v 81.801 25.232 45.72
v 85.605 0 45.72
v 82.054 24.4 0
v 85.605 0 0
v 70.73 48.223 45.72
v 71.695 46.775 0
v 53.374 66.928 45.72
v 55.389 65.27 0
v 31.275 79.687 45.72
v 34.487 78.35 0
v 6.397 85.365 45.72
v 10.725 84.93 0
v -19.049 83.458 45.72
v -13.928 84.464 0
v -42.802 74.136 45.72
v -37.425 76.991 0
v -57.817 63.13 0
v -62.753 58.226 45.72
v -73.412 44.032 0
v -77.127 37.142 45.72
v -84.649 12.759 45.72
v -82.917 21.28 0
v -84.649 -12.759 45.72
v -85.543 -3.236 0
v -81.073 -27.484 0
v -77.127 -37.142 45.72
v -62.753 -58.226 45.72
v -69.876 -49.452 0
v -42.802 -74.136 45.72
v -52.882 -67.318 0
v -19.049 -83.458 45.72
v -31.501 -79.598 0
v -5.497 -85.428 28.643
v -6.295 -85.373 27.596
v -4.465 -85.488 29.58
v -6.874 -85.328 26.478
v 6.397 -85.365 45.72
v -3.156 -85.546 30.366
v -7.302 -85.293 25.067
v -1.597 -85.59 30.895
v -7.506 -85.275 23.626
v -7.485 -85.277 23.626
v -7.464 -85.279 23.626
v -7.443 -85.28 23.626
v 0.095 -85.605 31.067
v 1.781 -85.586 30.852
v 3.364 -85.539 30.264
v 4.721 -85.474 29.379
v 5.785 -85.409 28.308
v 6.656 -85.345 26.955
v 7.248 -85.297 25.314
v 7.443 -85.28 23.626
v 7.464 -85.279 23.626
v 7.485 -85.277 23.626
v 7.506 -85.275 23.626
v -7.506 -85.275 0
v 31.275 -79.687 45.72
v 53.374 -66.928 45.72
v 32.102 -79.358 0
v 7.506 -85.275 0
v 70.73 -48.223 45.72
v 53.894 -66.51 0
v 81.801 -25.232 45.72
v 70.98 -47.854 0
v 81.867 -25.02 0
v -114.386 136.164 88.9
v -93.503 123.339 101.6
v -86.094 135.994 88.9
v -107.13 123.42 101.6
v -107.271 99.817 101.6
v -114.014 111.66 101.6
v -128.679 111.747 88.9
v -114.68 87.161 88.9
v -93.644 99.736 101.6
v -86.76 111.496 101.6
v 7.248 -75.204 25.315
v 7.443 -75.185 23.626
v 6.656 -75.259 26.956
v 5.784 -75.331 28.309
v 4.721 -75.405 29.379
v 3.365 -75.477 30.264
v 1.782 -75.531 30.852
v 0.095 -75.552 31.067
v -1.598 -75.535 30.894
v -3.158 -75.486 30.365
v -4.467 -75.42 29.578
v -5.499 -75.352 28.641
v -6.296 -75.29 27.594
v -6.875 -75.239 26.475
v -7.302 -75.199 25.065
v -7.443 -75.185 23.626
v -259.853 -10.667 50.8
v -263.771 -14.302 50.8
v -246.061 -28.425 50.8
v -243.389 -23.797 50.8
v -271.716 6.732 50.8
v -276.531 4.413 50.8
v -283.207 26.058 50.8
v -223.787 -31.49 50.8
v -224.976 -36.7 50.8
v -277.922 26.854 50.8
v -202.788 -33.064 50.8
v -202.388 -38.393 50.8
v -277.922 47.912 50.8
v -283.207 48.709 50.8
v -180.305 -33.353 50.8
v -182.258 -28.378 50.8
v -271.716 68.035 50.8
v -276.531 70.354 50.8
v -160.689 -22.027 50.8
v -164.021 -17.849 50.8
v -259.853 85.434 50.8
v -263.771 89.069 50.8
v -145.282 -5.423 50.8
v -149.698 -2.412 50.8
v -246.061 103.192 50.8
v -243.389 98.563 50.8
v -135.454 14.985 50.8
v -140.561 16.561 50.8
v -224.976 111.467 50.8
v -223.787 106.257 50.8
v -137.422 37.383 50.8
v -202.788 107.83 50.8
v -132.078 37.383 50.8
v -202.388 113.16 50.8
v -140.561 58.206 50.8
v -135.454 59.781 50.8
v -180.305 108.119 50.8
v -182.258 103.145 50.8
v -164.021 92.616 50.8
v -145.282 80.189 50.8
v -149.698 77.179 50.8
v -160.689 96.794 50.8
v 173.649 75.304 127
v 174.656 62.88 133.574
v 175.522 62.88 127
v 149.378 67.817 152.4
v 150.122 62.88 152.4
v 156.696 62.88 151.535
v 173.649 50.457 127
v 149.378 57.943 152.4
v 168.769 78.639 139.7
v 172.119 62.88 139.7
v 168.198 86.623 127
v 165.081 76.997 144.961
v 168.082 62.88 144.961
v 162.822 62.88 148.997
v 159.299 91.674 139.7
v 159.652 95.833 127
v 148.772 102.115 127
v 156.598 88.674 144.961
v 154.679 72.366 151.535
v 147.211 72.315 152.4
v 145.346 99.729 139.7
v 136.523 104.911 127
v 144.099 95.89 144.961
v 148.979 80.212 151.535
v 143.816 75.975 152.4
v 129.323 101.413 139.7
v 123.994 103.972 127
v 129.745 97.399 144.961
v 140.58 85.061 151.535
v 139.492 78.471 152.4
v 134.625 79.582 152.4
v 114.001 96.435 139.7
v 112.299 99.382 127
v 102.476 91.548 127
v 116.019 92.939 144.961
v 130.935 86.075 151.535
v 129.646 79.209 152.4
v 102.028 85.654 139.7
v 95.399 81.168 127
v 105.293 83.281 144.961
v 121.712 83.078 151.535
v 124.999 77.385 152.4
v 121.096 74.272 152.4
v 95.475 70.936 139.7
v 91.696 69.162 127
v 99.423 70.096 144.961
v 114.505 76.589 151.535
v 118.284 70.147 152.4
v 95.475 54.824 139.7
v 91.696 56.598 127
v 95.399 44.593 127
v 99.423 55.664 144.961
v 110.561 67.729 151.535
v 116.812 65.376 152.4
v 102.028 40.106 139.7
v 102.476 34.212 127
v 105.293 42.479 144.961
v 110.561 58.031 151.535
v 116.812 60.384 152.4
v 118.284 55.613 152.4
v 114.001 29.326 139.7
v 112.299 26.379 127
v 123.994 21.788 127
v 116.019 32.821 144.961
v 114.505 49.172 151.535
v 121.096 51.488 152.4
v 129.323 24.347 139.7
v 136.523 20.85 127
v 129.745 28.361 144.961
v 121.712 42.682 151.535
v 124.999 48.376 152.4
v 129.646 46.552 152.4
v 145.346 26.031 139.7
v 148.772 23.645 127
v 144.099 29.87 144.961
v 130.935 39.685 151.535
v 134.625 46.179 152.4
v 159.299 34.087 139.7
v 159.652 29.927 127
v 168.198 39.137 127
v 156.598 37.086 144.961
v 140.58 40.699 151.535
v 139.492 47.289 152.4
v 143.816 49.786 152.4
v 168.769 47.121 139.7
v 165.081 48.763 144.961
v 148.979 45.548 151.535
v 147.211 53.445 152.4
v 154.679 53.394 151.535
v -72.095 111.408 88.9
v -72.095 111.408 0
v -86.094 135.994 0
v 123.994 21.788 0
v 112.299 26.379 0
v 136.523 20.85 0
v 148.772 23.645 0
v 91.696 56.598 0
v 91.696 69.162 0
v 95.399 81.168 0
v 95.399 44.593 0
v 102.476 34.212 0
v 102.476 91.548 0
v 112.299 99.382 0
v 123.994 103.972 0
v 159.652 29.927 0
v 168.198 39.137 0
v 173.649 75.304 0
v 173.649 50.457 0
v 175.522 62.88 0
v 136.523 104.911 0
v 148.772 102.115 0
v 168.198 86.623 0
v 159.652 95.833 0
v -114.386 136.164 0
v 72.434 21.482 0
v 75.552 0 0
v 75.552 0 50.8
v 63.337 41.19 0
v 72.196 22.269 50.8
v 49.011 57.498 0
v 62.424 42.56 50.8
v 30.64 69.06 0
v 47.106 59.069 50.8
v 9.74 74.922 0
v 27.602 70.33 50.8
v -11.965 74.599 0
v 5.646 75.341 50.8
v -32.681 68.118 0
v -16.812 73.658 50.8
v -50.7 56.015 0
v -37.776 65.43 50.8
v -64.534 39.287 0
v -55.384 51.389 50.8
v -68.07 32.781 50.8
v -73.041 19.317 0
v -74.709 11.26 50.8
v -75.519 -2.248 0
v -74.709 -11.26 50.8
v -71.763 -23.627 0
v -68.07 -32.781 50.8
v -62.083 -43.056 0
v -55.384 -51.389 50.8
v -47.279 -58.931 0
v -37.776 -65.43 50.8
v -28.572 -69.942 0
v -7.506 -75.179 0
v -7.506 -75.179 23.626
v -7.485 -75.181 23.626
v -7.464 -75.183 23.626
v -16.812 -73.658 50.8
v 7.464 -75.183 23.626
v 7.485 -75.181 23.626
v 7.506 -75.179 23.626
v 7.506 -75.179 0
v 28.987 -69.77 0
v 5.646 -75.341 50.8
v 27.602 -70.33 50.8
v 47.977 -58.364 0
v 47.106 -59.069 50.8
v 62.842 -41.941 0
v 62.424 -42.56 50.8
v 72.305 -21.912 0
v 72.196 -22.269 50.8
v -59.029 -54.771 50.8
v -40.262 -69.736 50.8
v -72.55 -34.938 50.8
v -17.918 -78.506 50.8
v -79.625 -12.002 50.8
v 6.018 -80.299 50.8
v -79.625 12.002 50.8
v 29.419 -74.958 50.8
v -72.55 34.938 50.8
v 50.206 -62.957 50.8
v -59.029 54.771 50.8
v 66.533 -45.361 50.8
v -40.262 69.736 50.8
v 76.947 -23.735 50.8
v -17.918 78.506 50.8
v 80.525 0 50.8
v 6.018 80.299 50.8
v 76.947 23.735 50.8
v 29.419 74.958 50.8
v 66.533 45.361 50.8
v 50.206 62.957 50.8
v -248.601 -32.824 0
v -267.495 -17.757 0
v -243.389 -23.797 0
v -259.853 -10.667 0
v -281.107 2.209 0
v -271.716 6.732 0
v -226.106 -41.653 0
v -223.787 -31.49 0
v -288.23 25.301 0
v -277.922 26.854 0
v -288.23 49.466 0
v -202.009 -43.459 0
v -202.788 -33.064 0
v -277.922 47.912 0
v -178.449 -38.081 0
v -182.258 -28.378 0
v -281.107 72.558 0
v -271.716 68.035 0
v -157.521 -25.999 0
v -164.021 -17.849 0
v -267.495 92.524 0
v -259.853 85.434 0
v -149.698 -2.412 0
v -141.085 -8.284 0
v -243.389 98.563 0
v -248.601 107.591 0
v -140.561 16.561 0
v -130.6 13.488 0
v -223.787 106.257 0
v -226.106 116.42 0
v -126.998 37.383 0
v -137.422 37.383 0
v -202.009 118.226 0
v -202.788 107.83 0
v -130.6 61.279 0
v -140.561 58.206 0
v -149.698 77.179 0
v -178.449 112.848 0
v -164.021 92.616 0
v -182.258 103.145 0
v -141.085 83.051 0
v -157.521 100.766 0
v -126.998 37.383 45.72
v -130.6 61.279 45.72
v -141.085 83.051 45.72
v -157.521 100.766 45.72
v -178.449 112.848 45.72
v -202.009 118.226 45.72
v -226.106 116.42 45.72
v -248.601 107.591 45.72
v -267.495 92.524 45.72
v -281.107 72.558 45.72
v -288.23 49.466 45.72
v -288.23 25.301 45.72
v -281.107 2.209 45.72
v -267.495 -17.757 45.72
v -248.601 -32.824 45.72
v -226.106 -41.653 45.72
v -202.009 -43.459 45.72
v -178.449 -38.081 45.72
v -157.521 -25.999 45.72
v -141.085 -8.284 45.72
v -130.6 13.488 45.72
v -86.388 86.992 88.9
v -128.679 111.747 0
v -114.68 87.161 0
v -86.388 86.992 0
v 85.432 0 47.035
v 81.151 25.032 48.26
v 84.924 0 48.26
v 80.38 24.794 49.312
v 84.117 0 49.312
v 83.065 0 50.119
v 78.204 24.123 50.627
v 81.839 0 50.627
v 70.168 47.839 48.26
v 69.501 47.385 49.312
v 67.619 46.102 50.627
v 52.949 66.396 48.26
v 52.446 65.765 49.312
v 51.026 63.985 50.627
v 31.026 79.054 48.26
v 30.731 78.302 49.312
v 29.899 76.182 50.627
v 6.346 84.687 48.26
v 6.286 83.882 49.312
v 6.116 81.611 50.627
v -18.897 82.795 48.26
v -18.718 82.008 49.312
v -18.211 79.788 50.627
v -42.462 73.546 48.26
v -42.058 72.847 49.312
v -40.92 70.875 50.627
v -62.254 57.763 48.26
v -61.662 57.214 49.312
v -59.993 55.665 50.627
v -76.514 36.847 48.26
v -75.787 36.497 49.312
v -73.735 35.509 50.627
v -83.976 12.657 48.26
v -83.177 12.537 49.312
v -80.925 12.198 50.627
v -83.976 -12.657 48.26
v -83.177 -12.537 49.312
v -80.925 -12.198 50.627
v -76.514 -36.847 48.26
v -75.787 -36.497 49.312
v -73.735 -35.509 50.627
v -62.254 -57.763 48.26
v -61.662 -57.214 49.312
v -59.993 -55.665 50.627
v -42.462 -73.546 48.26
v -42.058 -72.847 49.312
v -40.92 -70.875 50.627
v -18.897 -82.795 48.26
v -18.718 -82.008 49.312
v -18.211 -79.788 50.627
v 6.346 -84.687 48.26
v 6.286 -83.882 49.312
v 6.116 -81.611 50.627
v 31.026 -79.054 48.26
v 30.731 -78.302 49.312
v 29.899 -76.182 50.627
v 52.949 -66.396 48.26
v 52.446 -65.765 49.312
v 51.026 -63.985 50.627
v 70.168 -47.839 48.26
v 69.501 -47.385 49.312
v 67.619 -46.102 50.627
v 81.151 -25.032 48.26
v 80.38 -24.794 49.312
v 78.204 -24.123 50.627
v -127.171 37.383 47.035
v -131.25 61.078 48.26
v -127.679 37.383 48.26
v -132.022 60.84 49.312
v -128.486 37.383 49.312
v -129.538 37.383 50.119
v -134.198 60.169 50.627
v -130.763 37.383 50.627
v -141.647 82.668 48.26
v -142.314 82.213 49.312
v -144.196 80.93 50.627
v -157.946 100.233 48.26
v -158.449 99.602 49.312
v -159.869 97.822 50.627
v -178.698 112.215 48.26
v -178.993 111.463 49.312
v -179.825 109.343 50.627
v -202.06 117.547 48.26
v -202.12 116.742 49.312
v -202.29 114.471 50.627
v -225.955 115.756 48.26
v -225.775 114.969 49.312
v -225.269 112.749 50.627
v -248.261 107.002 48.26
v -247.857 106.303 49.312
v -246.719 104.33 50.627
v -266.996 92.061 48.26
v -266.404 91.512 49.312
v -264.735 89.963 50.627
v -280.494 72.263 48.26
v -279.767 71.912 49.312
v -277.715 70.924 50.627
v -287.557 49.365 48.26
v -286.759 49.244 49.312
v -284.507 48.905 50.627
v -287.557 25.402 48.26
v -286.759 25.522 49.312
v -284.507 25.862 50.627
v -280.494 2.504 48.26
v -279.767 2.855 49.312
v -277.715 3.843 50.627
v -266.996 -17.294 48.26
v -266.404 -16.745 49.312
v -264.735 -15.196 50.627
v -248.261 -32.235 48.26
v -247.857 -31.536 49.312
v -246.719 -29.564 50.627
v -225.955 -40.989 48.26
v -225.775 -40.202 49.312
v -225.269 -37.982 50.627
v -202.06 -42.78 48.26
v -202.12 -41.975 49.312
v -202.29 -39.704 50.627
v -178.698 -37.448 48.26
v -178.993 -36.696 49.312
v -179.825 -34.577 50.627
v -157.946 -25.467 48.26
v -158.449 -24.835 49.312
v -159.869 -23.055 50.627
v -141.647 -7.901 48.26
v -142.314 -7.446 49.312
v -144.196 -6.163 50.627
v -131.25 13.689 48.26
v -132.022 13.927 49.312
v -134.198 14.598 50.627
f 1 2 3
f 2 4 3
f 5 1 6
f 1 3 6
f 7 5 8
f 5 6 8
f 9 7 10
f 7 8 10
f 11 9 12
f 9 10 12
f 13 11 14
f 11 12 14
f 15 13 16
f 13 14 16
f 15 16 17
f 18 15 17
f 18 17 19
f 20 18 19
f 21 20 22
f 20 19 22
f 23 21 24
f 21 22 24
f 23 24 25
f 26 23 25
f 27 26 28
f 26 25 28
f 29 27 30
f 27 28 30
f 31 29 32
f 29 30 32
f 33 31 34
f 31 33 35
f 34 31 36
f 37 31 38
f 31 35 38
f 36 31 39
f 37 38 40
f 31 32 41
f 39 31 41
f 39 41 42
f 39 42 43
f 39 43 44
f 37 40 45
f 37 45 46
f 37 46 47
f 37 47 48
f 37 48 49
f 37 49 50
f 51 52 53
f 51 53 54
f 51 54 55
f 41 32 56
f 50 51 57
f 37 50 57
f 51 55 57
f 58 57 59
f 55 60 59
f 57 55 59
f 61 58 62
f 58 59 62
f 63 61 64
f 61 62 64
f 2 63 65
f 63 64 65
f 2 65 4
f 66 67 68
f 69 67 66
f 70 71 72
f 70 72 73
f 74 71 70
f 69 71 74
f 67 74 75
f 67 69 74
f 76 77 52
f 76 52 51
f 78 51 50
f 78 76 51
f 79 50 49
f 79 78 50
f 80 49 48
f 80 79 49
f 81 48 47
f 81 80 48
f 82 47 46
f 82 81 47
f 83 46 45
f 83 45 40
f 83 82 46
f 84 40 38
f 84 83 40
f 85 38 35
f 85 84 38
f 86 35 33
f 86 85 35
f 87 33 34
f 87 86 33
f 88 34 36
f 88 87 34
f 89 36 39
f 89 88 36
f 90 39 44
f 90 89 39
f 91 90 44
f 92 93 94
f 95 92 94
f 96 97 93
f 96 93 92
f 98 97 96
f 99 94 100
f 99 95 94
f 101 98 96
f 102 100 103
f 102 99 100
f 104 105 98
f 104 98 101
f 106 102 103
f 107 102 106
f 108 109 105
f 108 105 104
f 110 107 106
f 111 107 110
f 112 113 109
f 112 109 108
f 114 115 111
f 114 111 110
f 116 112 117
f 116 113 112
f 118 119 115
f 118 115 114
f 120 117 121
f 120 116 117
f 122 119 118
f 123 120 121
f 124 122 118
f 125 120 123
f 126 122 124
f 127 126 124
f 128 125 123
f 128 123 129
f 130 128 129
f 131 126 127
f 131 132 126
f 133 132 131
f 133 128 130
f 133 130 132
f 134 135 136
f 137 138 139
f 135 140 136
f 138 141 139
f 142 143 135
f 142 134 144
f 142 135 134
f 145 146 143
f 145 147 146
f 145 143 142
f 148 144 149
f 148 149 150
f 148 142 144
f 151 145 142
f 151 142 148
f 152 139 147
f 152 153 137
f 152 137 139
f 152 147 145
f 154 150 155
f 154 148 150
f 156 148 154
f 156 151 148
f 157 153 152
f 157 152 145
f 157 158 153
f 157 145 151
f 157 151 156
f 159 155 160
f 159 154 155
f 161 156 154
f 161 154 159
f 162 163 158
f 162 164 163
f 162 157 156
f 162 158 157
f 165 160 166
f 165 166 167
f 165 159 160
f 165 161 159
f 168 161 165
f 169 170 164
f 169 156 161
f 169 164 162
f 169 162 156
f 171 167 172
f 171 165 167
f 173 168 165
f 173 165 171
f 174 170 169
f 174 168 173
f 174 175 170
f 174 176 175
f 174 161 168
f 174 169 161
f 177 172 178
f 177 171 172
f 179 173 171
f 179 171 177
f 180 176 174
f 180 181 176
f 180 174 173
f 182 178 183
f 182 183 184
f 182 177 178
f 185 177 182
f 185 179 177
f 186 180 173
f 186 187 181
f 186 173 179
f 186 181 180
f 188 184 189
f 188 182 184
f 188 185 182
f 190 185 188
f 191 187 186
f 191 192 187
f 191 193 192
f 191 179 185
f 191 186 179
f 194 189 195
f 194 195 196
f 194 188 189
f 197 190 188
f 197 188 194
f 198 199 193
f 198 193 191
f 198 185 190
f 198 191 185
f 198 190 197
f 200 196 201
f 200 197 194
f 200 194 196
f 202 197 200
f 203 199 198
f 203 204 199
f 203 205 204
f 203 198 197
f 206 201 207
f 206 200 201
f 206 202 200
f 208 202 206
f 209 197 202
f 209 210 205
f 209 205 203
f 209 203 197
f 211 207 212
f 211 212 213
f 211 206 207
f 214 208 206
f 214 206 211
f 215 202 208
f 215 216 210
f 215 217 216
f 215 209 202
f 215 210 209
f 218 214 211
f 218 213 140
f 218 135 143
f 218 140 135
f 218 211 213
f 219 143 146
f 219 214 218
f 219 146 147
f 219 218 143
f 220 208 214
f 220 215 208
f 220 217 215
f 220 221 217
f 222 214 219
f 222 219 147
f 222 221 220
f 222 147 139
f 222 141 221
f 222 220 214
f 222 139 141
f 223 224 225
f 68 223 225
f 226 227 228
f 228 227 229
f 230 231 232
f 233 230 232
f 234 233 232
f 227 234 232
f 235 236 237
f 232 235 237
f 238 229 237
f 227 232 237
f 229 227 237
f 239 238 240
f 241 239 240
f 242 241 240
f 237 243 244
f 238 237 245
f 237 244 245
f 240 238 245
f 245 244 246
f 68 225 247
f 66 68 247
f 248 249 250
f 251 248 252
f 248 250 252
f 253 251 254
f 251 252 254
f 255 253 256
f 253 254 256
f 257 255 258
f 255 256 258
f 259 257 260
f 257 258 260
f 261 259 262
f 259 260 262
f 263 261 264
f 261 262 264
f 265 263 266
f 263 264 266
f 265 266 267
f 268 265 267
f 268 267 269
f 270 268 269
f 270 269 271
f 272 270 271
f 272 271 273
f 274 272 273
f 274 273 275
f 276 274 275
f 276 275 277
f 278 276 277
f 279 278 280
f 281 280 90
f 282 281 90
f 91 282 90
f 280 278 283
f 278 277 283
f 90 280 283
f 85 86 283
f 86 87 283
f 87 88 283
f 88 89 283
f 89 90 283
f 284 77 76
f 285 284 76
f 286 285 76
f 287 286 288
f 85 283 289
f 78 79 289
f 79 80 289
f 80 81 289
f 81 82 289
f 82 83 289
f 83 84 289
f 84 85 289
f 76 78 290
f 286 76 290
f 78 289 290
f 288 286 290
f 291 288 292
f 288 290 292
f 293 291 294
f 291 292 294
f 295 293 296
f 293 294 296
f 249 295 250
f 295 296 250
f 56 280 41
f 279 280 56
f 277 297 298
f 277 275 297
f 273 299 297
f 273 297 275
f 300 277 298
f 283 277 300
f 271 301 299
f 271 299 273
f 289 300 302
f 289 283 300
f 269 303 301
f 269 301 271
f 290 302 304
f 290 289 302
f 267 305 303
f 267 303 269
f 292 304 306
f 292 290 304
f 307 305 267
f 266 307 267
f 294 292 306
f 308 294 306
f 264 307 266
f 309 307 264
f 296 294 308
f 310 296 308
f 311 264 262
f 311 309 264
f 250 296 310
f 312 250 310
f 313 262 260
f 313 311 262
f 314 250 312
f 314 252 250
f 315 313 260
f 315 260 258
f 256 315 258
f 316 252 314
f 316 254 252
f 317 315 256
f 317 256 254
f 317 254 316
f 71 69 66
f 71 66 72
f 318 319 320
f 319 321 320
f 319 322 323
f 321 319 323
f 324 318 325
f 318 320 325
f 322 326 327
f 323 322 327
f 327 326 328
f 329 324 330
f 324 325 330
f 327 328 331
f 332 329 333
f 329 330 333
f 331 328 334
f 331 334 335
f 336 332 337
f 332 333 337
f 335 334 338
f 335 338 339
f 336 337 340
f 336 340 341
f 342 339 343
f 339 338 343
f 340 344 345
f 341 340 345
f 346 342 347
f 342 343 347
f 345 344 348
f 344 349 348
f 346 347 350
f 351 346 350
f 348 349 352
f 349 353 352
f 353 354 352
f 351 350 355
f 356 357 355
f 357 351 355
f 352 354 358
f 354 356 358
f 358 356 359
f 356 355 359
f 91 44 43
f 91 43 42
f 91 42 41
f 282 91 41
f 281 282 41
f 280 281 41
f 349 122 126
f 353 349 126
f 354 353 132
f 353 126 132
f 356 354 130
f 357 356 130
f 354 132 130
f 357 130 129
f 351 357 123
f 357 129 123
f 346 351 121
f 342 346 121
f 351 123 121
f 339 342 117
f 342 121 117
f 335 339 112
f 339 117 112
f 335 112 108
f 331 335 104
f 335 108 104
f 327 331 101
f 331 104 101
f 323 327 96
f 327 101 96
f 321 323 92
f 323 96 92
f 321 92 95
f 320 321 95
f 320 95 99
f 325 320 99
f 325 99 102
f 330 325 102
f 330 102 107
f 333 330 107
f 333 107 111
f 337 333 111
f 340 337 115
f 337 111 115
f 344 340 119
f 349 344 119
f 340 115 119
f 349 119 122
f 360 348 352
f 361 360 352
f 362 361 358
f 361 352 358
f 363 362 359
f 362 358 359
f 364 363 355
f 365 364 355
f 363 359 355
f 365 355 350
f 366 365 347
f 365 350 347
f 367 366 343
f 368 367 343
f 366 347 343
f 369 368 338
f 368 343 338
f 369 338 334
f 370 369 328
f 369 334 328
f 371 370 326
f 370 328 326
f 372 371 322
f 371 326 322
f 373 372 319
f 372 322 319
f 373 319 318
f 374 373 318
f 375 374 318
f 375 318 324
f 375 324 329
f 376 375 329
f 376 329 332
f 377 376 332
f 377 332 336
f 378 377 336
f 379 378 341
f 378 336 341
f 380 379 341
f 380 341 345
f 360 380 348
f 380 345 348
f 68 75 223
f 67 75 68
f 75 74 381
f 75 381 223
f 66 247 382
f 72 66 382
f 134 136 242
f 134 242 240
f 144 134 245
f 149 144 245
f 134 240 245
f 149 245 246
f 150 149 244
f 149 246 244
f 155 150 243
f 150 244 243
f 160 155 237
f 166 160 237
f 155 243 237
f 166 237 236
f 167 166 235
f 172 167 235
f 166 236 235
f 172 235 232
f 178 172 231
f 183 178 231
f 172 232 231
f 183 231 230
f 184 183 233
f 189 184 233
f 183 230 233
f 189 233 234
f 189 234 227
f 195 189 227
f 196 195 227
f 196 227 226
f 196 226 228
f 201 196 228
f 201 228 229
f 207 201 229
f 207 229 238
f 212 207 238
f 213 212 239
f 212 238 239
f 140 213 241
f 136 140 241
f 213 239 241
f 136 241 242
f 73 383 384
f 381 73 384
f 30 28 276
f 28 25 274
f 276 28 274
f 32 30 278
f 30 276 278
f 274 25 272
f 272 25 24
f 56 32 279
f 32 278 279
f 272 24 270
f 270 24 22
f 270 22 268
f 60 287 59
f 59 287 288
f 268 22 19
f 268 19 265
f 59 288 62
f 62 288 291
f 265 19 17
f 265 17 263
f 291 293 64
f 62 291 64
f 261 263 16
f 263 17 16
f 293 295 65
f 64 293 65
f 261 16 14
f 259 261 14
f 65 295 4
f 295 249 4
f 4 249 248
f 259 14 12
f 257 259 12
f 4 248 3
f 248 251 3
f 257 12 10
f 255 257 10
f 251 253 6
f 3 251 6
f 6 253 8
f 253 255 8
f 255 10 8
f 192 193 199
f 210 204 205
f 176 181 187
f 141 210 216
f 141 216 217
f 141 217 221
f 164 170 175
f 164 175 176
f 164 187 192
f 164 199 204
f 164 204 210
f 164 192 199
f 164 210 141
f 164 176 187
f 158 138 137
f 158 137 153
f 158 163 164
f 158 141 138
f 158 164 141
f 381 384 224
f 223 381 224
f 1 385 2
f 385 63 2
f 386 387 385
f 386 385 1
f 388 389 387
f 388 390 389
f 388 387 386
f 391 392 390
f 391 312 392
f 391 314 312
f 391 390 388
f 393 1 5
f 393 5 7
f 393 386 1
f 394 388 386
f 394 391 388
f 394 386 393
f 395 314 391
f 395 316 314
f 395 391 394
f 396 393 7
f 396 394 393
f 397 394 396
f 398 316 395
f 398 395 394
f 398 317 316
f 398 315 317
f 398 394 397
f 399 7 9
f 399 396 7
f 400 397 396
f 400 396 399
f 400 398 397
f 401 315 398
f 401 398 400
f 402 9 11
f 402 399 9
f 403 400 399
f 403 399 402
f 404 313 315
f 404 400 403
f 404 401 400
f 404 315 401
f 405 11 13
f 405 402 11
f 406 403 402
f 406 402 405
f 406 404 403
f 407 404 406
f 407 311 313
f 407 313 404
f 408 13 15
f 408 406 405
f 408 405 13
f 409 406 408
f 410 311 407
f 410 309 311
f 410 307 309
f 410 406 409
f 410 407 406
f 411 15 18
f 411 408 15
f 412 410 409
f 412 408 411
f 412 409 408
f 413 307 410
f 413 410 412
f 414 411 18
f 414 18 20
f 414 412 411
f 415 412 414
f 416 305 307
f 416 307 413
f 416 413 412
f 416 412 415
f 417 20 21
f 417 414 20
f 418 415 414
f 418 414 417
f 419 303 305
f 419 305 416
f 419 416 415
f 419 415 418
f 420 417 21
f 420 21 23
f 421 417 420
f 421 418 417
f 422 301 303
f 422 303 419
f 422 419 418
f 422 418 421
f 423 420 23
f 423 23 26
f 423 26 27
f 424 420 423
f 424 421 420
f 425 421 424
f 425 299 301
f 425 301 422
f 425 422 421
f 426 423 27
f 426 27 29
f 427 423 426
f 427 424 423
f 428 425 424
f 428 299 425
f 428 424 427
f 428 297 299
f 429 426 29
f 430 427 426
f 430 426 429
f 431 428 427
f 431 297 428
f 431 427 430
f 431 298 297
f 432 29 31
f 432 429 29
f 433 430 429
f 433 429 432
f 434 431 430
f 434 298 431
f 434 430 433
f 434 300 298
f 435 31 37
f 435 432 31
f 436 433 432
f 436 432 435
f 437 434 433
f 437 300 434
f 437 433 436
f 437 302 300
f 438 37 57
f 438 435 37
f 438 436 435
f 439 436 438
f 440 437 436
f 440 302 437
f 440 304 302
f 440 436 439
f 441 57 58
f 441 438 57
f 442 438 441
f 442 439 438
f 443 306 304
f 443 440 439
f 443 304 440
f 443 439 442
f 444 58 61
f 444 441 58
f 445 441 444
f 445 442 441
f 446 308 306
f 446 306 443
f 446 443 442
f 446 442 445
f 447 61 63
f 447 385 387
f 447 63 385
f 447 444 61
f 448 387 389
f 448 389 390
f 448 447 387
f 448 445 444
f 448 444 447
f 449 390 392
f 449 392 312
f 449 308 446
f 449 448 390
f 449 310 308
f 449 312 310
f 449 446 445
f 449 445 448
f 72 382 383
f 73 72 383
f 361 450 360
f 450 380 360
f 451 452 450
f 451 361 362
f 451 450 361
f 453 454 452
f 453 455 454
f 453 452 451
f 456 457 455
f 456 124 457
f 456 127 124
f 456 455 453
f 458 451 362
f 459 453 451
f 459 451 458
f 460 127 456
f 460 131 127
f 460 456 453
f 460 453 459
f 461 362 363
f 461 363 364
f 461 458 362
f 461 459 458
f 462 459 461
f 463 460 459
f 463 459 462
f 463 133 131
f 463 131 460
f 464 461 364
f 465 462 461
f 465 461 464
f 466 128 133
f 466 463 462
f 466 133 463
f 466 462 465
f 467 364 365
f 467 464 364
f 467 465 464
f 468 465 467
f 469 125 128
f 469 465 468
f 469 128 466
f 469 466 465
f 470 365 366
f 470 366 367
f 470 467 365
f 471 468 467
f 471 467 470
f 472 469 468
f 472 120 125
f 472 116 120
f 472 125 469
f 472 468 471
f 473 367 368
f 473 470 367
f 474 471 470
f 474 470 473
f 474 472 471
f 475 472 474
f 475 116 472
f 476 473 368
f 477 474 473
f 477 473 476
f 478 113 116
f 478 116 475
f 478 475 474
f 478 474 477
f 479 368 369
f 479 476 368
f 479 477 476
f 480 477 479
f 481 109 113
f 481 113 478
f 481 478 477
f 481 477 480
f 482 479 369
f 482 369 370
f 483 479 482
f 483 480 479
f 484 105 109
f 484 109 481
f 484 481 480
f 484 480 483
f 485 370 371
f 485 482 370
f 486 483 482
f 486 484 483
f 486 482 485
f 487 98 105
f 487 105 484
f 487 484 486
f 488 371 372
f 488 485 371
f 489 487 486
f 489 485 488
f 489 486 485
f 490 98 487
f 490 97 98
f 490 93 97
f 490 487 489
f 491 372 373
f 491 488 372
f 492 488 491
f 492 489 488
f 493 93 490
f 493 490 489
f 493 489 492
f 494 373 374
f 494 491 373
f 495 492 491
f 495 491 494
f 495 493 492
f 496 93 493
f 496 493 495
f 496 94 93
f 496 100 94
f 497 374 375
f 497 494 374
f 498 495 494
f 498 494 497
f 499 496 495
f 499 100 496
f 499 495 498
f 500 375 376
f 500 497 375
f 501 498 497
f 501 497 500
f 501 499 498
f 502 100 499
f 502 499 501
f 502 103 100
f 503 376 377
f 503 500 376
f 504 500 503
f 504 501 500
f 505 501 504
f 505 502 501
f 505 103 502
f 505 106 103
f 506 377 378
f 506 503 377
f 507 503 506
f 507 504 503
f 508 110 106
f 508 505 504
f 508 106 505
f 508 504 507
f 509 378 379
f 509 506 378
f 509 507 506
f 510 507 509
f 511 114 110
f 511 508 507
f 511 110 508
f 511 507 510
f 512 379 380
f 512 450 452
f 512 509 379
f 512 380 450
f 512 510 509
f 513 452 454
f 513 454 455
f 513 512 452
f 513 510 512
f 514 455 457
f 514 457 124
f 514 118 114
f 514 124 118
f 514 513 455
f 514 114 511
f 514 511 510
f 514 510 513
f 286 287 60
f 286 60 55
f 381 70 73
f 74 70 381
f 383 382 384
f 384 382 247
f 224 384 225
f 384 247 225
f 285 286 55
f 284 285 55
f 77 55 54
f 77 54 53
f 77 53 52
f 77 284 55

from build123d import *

# Parameters (mm, degrees)
F0_R      = 85.6046340439
F1_DEPTH  = 50.8
F2_R      = 5.08
F3_R      = 75.5523616999
F4_DEPTH  = 50.8
F6_DEPTH  = 101.6
F7_R      = 42.1483813128
F8_DEPTH  = 152.4
F9_R      = 25.4
F10_R     = 81.0688238491
F11_DEPTH = 50.8
F12_R     = 5.08
F13_R     = 70.6445797899
F14_DEPTH = 50.8
F16_DEPTH = 101.6
F17_SIZE  = 12.7


with BuildPart() as f1:
    # F0 (on Top) → F1 (new body)
    with BuildSketch(Plane.XY):
        Circle(F0_R)
    extrude(amount=F1_DEPTH)

    # F2
    f2_edges = [f1.edges().sort_by_distance(p)[0] for p in [
        (-85.604634, 0, 50.8),
    ]]
    fillet(f2_edges, radius=F2_R)

    # F3 (on face) → F4 (cut)
    with BuildSketch(Plane.XY.offset(50.8)):
        Circle(F3_R)
    extrude(amount=-F4_DEPTH, mode=Mode.SUBTRACT)

    # F5 (on Front) → F6 (cut)
    with BuildSketch(Plane.XZ):
        with BuildLine():
            Line((-7.5062415563, 23.6255042255), (-7.5062415563, 0))
            Line((-7.5062415563, 0), (7.5062415563, 0))
            Line((7.5062415563, 0), (7.5062415563, 23.6255042255))
            Line((7.5062415563, 23.6255042255), (7.4425271825, 23.6255042255))
            ThreePointArc((7.4425271825, 23.6255042255), (0, 16.182977043), (-7.4425271825, 23.6255042255))
            Line((-7.4425271825, 23.6255042255), (-7.5062415563, 23.6255042255))
        make_face()
        with BuildLine():
            ThreePointArc((7.4425271825, 23.6255042255), (0, 31.068031408), (-7.4425271825, 23.6255042255))
            Line((-7.4425271825, 23.6255042255), (7.4425271825, 23.6255042255))
        make_face()
        with BuildLine():
            Line((7.4425271825, 23.6255042255), (-7.4425271825, 23.6255042255))
            ThreePointArc((-7.4425271825, 23.6255042255), (0, 16.182977043), (7.4425271825, 23.6255042255))
        make_face()
    extrude(amount=F6_DEPTH, mode=Mode.SUBTRACT)


with BuildPart() as f8:
    # F7 (on Top) → F8 (new body)
    with BuildSketch(Plane.XY):
        with Locations((133.3732753992, 62.8801062703)):
            Circle(F7_R)
    extrude(amount=F8_DEPTH)

    # F9
    f9_edges = [f8.edges().sort_by_distance(p)[0] for p in [
        (91.224894, 62.880106, 152.4),
    ]]
    fillet(f9_edges, radius=F9_R)


with BuildPart() as f11:
    # F10 (on Top) → F11 (new body)
    with BuildSketch(Plane.XY):
        with Locations((-208.0669552088, 37.3833999038)):
            Circle(F10_R)
    extrude(amount=F11_DEPTH)

    # F12
    f12_edges = [f11.edges().sort_by_distance(p)[0] for p in [
        (-289.135779, 37.3834, 50.8),
    ]]
    fillet(f12_edges, radius=F12_R)

    # F13 (on face) → F14 (cut)
    with BuildSketch(Plane.XY.offset(50.8)):
        with Locations((-208.0669552088, 37.3833999038)):
            Circle(F13_R)
    extrude(amount=-F14_DEPTH, mode=Mode.SUBTRACT)


with BuildPart() as f16:
    # F15 (on Top) → F16 (new body)
    with BuildSketch(Plane.XY):
        Polygon((-114.3861618652, 136.1639231941), (-128.6787781105, 111.7473661402), (-114.6797275515, 87.1613188582), (-86.3880607472, 86.9918286303), (-72.0954445019, 111.4083856842), (-86.0944950609, 135.9944329661), align=None)
    extrude(amount=F16_DEPTH)

    # F17
    f17_edges = [f16.edges().sort_by_distance(p)[0] for p in [
        (-121.53247, 123.955645, 101.6),
        (-121.679253, 99.454342, 101.6),
        (-100.533894, 87.076574, 101.6),
        (-79.241753, 99.200107, 101.6),
        (-79.09497, 123.701409, 101.6),
        (-100.240328, 136.079178, 101.6),
    ]]
    chamfer(f17_edges, length=F17_SIZE)


solid = Compound([f1.part, f8.part, f11.part, f16.part])
